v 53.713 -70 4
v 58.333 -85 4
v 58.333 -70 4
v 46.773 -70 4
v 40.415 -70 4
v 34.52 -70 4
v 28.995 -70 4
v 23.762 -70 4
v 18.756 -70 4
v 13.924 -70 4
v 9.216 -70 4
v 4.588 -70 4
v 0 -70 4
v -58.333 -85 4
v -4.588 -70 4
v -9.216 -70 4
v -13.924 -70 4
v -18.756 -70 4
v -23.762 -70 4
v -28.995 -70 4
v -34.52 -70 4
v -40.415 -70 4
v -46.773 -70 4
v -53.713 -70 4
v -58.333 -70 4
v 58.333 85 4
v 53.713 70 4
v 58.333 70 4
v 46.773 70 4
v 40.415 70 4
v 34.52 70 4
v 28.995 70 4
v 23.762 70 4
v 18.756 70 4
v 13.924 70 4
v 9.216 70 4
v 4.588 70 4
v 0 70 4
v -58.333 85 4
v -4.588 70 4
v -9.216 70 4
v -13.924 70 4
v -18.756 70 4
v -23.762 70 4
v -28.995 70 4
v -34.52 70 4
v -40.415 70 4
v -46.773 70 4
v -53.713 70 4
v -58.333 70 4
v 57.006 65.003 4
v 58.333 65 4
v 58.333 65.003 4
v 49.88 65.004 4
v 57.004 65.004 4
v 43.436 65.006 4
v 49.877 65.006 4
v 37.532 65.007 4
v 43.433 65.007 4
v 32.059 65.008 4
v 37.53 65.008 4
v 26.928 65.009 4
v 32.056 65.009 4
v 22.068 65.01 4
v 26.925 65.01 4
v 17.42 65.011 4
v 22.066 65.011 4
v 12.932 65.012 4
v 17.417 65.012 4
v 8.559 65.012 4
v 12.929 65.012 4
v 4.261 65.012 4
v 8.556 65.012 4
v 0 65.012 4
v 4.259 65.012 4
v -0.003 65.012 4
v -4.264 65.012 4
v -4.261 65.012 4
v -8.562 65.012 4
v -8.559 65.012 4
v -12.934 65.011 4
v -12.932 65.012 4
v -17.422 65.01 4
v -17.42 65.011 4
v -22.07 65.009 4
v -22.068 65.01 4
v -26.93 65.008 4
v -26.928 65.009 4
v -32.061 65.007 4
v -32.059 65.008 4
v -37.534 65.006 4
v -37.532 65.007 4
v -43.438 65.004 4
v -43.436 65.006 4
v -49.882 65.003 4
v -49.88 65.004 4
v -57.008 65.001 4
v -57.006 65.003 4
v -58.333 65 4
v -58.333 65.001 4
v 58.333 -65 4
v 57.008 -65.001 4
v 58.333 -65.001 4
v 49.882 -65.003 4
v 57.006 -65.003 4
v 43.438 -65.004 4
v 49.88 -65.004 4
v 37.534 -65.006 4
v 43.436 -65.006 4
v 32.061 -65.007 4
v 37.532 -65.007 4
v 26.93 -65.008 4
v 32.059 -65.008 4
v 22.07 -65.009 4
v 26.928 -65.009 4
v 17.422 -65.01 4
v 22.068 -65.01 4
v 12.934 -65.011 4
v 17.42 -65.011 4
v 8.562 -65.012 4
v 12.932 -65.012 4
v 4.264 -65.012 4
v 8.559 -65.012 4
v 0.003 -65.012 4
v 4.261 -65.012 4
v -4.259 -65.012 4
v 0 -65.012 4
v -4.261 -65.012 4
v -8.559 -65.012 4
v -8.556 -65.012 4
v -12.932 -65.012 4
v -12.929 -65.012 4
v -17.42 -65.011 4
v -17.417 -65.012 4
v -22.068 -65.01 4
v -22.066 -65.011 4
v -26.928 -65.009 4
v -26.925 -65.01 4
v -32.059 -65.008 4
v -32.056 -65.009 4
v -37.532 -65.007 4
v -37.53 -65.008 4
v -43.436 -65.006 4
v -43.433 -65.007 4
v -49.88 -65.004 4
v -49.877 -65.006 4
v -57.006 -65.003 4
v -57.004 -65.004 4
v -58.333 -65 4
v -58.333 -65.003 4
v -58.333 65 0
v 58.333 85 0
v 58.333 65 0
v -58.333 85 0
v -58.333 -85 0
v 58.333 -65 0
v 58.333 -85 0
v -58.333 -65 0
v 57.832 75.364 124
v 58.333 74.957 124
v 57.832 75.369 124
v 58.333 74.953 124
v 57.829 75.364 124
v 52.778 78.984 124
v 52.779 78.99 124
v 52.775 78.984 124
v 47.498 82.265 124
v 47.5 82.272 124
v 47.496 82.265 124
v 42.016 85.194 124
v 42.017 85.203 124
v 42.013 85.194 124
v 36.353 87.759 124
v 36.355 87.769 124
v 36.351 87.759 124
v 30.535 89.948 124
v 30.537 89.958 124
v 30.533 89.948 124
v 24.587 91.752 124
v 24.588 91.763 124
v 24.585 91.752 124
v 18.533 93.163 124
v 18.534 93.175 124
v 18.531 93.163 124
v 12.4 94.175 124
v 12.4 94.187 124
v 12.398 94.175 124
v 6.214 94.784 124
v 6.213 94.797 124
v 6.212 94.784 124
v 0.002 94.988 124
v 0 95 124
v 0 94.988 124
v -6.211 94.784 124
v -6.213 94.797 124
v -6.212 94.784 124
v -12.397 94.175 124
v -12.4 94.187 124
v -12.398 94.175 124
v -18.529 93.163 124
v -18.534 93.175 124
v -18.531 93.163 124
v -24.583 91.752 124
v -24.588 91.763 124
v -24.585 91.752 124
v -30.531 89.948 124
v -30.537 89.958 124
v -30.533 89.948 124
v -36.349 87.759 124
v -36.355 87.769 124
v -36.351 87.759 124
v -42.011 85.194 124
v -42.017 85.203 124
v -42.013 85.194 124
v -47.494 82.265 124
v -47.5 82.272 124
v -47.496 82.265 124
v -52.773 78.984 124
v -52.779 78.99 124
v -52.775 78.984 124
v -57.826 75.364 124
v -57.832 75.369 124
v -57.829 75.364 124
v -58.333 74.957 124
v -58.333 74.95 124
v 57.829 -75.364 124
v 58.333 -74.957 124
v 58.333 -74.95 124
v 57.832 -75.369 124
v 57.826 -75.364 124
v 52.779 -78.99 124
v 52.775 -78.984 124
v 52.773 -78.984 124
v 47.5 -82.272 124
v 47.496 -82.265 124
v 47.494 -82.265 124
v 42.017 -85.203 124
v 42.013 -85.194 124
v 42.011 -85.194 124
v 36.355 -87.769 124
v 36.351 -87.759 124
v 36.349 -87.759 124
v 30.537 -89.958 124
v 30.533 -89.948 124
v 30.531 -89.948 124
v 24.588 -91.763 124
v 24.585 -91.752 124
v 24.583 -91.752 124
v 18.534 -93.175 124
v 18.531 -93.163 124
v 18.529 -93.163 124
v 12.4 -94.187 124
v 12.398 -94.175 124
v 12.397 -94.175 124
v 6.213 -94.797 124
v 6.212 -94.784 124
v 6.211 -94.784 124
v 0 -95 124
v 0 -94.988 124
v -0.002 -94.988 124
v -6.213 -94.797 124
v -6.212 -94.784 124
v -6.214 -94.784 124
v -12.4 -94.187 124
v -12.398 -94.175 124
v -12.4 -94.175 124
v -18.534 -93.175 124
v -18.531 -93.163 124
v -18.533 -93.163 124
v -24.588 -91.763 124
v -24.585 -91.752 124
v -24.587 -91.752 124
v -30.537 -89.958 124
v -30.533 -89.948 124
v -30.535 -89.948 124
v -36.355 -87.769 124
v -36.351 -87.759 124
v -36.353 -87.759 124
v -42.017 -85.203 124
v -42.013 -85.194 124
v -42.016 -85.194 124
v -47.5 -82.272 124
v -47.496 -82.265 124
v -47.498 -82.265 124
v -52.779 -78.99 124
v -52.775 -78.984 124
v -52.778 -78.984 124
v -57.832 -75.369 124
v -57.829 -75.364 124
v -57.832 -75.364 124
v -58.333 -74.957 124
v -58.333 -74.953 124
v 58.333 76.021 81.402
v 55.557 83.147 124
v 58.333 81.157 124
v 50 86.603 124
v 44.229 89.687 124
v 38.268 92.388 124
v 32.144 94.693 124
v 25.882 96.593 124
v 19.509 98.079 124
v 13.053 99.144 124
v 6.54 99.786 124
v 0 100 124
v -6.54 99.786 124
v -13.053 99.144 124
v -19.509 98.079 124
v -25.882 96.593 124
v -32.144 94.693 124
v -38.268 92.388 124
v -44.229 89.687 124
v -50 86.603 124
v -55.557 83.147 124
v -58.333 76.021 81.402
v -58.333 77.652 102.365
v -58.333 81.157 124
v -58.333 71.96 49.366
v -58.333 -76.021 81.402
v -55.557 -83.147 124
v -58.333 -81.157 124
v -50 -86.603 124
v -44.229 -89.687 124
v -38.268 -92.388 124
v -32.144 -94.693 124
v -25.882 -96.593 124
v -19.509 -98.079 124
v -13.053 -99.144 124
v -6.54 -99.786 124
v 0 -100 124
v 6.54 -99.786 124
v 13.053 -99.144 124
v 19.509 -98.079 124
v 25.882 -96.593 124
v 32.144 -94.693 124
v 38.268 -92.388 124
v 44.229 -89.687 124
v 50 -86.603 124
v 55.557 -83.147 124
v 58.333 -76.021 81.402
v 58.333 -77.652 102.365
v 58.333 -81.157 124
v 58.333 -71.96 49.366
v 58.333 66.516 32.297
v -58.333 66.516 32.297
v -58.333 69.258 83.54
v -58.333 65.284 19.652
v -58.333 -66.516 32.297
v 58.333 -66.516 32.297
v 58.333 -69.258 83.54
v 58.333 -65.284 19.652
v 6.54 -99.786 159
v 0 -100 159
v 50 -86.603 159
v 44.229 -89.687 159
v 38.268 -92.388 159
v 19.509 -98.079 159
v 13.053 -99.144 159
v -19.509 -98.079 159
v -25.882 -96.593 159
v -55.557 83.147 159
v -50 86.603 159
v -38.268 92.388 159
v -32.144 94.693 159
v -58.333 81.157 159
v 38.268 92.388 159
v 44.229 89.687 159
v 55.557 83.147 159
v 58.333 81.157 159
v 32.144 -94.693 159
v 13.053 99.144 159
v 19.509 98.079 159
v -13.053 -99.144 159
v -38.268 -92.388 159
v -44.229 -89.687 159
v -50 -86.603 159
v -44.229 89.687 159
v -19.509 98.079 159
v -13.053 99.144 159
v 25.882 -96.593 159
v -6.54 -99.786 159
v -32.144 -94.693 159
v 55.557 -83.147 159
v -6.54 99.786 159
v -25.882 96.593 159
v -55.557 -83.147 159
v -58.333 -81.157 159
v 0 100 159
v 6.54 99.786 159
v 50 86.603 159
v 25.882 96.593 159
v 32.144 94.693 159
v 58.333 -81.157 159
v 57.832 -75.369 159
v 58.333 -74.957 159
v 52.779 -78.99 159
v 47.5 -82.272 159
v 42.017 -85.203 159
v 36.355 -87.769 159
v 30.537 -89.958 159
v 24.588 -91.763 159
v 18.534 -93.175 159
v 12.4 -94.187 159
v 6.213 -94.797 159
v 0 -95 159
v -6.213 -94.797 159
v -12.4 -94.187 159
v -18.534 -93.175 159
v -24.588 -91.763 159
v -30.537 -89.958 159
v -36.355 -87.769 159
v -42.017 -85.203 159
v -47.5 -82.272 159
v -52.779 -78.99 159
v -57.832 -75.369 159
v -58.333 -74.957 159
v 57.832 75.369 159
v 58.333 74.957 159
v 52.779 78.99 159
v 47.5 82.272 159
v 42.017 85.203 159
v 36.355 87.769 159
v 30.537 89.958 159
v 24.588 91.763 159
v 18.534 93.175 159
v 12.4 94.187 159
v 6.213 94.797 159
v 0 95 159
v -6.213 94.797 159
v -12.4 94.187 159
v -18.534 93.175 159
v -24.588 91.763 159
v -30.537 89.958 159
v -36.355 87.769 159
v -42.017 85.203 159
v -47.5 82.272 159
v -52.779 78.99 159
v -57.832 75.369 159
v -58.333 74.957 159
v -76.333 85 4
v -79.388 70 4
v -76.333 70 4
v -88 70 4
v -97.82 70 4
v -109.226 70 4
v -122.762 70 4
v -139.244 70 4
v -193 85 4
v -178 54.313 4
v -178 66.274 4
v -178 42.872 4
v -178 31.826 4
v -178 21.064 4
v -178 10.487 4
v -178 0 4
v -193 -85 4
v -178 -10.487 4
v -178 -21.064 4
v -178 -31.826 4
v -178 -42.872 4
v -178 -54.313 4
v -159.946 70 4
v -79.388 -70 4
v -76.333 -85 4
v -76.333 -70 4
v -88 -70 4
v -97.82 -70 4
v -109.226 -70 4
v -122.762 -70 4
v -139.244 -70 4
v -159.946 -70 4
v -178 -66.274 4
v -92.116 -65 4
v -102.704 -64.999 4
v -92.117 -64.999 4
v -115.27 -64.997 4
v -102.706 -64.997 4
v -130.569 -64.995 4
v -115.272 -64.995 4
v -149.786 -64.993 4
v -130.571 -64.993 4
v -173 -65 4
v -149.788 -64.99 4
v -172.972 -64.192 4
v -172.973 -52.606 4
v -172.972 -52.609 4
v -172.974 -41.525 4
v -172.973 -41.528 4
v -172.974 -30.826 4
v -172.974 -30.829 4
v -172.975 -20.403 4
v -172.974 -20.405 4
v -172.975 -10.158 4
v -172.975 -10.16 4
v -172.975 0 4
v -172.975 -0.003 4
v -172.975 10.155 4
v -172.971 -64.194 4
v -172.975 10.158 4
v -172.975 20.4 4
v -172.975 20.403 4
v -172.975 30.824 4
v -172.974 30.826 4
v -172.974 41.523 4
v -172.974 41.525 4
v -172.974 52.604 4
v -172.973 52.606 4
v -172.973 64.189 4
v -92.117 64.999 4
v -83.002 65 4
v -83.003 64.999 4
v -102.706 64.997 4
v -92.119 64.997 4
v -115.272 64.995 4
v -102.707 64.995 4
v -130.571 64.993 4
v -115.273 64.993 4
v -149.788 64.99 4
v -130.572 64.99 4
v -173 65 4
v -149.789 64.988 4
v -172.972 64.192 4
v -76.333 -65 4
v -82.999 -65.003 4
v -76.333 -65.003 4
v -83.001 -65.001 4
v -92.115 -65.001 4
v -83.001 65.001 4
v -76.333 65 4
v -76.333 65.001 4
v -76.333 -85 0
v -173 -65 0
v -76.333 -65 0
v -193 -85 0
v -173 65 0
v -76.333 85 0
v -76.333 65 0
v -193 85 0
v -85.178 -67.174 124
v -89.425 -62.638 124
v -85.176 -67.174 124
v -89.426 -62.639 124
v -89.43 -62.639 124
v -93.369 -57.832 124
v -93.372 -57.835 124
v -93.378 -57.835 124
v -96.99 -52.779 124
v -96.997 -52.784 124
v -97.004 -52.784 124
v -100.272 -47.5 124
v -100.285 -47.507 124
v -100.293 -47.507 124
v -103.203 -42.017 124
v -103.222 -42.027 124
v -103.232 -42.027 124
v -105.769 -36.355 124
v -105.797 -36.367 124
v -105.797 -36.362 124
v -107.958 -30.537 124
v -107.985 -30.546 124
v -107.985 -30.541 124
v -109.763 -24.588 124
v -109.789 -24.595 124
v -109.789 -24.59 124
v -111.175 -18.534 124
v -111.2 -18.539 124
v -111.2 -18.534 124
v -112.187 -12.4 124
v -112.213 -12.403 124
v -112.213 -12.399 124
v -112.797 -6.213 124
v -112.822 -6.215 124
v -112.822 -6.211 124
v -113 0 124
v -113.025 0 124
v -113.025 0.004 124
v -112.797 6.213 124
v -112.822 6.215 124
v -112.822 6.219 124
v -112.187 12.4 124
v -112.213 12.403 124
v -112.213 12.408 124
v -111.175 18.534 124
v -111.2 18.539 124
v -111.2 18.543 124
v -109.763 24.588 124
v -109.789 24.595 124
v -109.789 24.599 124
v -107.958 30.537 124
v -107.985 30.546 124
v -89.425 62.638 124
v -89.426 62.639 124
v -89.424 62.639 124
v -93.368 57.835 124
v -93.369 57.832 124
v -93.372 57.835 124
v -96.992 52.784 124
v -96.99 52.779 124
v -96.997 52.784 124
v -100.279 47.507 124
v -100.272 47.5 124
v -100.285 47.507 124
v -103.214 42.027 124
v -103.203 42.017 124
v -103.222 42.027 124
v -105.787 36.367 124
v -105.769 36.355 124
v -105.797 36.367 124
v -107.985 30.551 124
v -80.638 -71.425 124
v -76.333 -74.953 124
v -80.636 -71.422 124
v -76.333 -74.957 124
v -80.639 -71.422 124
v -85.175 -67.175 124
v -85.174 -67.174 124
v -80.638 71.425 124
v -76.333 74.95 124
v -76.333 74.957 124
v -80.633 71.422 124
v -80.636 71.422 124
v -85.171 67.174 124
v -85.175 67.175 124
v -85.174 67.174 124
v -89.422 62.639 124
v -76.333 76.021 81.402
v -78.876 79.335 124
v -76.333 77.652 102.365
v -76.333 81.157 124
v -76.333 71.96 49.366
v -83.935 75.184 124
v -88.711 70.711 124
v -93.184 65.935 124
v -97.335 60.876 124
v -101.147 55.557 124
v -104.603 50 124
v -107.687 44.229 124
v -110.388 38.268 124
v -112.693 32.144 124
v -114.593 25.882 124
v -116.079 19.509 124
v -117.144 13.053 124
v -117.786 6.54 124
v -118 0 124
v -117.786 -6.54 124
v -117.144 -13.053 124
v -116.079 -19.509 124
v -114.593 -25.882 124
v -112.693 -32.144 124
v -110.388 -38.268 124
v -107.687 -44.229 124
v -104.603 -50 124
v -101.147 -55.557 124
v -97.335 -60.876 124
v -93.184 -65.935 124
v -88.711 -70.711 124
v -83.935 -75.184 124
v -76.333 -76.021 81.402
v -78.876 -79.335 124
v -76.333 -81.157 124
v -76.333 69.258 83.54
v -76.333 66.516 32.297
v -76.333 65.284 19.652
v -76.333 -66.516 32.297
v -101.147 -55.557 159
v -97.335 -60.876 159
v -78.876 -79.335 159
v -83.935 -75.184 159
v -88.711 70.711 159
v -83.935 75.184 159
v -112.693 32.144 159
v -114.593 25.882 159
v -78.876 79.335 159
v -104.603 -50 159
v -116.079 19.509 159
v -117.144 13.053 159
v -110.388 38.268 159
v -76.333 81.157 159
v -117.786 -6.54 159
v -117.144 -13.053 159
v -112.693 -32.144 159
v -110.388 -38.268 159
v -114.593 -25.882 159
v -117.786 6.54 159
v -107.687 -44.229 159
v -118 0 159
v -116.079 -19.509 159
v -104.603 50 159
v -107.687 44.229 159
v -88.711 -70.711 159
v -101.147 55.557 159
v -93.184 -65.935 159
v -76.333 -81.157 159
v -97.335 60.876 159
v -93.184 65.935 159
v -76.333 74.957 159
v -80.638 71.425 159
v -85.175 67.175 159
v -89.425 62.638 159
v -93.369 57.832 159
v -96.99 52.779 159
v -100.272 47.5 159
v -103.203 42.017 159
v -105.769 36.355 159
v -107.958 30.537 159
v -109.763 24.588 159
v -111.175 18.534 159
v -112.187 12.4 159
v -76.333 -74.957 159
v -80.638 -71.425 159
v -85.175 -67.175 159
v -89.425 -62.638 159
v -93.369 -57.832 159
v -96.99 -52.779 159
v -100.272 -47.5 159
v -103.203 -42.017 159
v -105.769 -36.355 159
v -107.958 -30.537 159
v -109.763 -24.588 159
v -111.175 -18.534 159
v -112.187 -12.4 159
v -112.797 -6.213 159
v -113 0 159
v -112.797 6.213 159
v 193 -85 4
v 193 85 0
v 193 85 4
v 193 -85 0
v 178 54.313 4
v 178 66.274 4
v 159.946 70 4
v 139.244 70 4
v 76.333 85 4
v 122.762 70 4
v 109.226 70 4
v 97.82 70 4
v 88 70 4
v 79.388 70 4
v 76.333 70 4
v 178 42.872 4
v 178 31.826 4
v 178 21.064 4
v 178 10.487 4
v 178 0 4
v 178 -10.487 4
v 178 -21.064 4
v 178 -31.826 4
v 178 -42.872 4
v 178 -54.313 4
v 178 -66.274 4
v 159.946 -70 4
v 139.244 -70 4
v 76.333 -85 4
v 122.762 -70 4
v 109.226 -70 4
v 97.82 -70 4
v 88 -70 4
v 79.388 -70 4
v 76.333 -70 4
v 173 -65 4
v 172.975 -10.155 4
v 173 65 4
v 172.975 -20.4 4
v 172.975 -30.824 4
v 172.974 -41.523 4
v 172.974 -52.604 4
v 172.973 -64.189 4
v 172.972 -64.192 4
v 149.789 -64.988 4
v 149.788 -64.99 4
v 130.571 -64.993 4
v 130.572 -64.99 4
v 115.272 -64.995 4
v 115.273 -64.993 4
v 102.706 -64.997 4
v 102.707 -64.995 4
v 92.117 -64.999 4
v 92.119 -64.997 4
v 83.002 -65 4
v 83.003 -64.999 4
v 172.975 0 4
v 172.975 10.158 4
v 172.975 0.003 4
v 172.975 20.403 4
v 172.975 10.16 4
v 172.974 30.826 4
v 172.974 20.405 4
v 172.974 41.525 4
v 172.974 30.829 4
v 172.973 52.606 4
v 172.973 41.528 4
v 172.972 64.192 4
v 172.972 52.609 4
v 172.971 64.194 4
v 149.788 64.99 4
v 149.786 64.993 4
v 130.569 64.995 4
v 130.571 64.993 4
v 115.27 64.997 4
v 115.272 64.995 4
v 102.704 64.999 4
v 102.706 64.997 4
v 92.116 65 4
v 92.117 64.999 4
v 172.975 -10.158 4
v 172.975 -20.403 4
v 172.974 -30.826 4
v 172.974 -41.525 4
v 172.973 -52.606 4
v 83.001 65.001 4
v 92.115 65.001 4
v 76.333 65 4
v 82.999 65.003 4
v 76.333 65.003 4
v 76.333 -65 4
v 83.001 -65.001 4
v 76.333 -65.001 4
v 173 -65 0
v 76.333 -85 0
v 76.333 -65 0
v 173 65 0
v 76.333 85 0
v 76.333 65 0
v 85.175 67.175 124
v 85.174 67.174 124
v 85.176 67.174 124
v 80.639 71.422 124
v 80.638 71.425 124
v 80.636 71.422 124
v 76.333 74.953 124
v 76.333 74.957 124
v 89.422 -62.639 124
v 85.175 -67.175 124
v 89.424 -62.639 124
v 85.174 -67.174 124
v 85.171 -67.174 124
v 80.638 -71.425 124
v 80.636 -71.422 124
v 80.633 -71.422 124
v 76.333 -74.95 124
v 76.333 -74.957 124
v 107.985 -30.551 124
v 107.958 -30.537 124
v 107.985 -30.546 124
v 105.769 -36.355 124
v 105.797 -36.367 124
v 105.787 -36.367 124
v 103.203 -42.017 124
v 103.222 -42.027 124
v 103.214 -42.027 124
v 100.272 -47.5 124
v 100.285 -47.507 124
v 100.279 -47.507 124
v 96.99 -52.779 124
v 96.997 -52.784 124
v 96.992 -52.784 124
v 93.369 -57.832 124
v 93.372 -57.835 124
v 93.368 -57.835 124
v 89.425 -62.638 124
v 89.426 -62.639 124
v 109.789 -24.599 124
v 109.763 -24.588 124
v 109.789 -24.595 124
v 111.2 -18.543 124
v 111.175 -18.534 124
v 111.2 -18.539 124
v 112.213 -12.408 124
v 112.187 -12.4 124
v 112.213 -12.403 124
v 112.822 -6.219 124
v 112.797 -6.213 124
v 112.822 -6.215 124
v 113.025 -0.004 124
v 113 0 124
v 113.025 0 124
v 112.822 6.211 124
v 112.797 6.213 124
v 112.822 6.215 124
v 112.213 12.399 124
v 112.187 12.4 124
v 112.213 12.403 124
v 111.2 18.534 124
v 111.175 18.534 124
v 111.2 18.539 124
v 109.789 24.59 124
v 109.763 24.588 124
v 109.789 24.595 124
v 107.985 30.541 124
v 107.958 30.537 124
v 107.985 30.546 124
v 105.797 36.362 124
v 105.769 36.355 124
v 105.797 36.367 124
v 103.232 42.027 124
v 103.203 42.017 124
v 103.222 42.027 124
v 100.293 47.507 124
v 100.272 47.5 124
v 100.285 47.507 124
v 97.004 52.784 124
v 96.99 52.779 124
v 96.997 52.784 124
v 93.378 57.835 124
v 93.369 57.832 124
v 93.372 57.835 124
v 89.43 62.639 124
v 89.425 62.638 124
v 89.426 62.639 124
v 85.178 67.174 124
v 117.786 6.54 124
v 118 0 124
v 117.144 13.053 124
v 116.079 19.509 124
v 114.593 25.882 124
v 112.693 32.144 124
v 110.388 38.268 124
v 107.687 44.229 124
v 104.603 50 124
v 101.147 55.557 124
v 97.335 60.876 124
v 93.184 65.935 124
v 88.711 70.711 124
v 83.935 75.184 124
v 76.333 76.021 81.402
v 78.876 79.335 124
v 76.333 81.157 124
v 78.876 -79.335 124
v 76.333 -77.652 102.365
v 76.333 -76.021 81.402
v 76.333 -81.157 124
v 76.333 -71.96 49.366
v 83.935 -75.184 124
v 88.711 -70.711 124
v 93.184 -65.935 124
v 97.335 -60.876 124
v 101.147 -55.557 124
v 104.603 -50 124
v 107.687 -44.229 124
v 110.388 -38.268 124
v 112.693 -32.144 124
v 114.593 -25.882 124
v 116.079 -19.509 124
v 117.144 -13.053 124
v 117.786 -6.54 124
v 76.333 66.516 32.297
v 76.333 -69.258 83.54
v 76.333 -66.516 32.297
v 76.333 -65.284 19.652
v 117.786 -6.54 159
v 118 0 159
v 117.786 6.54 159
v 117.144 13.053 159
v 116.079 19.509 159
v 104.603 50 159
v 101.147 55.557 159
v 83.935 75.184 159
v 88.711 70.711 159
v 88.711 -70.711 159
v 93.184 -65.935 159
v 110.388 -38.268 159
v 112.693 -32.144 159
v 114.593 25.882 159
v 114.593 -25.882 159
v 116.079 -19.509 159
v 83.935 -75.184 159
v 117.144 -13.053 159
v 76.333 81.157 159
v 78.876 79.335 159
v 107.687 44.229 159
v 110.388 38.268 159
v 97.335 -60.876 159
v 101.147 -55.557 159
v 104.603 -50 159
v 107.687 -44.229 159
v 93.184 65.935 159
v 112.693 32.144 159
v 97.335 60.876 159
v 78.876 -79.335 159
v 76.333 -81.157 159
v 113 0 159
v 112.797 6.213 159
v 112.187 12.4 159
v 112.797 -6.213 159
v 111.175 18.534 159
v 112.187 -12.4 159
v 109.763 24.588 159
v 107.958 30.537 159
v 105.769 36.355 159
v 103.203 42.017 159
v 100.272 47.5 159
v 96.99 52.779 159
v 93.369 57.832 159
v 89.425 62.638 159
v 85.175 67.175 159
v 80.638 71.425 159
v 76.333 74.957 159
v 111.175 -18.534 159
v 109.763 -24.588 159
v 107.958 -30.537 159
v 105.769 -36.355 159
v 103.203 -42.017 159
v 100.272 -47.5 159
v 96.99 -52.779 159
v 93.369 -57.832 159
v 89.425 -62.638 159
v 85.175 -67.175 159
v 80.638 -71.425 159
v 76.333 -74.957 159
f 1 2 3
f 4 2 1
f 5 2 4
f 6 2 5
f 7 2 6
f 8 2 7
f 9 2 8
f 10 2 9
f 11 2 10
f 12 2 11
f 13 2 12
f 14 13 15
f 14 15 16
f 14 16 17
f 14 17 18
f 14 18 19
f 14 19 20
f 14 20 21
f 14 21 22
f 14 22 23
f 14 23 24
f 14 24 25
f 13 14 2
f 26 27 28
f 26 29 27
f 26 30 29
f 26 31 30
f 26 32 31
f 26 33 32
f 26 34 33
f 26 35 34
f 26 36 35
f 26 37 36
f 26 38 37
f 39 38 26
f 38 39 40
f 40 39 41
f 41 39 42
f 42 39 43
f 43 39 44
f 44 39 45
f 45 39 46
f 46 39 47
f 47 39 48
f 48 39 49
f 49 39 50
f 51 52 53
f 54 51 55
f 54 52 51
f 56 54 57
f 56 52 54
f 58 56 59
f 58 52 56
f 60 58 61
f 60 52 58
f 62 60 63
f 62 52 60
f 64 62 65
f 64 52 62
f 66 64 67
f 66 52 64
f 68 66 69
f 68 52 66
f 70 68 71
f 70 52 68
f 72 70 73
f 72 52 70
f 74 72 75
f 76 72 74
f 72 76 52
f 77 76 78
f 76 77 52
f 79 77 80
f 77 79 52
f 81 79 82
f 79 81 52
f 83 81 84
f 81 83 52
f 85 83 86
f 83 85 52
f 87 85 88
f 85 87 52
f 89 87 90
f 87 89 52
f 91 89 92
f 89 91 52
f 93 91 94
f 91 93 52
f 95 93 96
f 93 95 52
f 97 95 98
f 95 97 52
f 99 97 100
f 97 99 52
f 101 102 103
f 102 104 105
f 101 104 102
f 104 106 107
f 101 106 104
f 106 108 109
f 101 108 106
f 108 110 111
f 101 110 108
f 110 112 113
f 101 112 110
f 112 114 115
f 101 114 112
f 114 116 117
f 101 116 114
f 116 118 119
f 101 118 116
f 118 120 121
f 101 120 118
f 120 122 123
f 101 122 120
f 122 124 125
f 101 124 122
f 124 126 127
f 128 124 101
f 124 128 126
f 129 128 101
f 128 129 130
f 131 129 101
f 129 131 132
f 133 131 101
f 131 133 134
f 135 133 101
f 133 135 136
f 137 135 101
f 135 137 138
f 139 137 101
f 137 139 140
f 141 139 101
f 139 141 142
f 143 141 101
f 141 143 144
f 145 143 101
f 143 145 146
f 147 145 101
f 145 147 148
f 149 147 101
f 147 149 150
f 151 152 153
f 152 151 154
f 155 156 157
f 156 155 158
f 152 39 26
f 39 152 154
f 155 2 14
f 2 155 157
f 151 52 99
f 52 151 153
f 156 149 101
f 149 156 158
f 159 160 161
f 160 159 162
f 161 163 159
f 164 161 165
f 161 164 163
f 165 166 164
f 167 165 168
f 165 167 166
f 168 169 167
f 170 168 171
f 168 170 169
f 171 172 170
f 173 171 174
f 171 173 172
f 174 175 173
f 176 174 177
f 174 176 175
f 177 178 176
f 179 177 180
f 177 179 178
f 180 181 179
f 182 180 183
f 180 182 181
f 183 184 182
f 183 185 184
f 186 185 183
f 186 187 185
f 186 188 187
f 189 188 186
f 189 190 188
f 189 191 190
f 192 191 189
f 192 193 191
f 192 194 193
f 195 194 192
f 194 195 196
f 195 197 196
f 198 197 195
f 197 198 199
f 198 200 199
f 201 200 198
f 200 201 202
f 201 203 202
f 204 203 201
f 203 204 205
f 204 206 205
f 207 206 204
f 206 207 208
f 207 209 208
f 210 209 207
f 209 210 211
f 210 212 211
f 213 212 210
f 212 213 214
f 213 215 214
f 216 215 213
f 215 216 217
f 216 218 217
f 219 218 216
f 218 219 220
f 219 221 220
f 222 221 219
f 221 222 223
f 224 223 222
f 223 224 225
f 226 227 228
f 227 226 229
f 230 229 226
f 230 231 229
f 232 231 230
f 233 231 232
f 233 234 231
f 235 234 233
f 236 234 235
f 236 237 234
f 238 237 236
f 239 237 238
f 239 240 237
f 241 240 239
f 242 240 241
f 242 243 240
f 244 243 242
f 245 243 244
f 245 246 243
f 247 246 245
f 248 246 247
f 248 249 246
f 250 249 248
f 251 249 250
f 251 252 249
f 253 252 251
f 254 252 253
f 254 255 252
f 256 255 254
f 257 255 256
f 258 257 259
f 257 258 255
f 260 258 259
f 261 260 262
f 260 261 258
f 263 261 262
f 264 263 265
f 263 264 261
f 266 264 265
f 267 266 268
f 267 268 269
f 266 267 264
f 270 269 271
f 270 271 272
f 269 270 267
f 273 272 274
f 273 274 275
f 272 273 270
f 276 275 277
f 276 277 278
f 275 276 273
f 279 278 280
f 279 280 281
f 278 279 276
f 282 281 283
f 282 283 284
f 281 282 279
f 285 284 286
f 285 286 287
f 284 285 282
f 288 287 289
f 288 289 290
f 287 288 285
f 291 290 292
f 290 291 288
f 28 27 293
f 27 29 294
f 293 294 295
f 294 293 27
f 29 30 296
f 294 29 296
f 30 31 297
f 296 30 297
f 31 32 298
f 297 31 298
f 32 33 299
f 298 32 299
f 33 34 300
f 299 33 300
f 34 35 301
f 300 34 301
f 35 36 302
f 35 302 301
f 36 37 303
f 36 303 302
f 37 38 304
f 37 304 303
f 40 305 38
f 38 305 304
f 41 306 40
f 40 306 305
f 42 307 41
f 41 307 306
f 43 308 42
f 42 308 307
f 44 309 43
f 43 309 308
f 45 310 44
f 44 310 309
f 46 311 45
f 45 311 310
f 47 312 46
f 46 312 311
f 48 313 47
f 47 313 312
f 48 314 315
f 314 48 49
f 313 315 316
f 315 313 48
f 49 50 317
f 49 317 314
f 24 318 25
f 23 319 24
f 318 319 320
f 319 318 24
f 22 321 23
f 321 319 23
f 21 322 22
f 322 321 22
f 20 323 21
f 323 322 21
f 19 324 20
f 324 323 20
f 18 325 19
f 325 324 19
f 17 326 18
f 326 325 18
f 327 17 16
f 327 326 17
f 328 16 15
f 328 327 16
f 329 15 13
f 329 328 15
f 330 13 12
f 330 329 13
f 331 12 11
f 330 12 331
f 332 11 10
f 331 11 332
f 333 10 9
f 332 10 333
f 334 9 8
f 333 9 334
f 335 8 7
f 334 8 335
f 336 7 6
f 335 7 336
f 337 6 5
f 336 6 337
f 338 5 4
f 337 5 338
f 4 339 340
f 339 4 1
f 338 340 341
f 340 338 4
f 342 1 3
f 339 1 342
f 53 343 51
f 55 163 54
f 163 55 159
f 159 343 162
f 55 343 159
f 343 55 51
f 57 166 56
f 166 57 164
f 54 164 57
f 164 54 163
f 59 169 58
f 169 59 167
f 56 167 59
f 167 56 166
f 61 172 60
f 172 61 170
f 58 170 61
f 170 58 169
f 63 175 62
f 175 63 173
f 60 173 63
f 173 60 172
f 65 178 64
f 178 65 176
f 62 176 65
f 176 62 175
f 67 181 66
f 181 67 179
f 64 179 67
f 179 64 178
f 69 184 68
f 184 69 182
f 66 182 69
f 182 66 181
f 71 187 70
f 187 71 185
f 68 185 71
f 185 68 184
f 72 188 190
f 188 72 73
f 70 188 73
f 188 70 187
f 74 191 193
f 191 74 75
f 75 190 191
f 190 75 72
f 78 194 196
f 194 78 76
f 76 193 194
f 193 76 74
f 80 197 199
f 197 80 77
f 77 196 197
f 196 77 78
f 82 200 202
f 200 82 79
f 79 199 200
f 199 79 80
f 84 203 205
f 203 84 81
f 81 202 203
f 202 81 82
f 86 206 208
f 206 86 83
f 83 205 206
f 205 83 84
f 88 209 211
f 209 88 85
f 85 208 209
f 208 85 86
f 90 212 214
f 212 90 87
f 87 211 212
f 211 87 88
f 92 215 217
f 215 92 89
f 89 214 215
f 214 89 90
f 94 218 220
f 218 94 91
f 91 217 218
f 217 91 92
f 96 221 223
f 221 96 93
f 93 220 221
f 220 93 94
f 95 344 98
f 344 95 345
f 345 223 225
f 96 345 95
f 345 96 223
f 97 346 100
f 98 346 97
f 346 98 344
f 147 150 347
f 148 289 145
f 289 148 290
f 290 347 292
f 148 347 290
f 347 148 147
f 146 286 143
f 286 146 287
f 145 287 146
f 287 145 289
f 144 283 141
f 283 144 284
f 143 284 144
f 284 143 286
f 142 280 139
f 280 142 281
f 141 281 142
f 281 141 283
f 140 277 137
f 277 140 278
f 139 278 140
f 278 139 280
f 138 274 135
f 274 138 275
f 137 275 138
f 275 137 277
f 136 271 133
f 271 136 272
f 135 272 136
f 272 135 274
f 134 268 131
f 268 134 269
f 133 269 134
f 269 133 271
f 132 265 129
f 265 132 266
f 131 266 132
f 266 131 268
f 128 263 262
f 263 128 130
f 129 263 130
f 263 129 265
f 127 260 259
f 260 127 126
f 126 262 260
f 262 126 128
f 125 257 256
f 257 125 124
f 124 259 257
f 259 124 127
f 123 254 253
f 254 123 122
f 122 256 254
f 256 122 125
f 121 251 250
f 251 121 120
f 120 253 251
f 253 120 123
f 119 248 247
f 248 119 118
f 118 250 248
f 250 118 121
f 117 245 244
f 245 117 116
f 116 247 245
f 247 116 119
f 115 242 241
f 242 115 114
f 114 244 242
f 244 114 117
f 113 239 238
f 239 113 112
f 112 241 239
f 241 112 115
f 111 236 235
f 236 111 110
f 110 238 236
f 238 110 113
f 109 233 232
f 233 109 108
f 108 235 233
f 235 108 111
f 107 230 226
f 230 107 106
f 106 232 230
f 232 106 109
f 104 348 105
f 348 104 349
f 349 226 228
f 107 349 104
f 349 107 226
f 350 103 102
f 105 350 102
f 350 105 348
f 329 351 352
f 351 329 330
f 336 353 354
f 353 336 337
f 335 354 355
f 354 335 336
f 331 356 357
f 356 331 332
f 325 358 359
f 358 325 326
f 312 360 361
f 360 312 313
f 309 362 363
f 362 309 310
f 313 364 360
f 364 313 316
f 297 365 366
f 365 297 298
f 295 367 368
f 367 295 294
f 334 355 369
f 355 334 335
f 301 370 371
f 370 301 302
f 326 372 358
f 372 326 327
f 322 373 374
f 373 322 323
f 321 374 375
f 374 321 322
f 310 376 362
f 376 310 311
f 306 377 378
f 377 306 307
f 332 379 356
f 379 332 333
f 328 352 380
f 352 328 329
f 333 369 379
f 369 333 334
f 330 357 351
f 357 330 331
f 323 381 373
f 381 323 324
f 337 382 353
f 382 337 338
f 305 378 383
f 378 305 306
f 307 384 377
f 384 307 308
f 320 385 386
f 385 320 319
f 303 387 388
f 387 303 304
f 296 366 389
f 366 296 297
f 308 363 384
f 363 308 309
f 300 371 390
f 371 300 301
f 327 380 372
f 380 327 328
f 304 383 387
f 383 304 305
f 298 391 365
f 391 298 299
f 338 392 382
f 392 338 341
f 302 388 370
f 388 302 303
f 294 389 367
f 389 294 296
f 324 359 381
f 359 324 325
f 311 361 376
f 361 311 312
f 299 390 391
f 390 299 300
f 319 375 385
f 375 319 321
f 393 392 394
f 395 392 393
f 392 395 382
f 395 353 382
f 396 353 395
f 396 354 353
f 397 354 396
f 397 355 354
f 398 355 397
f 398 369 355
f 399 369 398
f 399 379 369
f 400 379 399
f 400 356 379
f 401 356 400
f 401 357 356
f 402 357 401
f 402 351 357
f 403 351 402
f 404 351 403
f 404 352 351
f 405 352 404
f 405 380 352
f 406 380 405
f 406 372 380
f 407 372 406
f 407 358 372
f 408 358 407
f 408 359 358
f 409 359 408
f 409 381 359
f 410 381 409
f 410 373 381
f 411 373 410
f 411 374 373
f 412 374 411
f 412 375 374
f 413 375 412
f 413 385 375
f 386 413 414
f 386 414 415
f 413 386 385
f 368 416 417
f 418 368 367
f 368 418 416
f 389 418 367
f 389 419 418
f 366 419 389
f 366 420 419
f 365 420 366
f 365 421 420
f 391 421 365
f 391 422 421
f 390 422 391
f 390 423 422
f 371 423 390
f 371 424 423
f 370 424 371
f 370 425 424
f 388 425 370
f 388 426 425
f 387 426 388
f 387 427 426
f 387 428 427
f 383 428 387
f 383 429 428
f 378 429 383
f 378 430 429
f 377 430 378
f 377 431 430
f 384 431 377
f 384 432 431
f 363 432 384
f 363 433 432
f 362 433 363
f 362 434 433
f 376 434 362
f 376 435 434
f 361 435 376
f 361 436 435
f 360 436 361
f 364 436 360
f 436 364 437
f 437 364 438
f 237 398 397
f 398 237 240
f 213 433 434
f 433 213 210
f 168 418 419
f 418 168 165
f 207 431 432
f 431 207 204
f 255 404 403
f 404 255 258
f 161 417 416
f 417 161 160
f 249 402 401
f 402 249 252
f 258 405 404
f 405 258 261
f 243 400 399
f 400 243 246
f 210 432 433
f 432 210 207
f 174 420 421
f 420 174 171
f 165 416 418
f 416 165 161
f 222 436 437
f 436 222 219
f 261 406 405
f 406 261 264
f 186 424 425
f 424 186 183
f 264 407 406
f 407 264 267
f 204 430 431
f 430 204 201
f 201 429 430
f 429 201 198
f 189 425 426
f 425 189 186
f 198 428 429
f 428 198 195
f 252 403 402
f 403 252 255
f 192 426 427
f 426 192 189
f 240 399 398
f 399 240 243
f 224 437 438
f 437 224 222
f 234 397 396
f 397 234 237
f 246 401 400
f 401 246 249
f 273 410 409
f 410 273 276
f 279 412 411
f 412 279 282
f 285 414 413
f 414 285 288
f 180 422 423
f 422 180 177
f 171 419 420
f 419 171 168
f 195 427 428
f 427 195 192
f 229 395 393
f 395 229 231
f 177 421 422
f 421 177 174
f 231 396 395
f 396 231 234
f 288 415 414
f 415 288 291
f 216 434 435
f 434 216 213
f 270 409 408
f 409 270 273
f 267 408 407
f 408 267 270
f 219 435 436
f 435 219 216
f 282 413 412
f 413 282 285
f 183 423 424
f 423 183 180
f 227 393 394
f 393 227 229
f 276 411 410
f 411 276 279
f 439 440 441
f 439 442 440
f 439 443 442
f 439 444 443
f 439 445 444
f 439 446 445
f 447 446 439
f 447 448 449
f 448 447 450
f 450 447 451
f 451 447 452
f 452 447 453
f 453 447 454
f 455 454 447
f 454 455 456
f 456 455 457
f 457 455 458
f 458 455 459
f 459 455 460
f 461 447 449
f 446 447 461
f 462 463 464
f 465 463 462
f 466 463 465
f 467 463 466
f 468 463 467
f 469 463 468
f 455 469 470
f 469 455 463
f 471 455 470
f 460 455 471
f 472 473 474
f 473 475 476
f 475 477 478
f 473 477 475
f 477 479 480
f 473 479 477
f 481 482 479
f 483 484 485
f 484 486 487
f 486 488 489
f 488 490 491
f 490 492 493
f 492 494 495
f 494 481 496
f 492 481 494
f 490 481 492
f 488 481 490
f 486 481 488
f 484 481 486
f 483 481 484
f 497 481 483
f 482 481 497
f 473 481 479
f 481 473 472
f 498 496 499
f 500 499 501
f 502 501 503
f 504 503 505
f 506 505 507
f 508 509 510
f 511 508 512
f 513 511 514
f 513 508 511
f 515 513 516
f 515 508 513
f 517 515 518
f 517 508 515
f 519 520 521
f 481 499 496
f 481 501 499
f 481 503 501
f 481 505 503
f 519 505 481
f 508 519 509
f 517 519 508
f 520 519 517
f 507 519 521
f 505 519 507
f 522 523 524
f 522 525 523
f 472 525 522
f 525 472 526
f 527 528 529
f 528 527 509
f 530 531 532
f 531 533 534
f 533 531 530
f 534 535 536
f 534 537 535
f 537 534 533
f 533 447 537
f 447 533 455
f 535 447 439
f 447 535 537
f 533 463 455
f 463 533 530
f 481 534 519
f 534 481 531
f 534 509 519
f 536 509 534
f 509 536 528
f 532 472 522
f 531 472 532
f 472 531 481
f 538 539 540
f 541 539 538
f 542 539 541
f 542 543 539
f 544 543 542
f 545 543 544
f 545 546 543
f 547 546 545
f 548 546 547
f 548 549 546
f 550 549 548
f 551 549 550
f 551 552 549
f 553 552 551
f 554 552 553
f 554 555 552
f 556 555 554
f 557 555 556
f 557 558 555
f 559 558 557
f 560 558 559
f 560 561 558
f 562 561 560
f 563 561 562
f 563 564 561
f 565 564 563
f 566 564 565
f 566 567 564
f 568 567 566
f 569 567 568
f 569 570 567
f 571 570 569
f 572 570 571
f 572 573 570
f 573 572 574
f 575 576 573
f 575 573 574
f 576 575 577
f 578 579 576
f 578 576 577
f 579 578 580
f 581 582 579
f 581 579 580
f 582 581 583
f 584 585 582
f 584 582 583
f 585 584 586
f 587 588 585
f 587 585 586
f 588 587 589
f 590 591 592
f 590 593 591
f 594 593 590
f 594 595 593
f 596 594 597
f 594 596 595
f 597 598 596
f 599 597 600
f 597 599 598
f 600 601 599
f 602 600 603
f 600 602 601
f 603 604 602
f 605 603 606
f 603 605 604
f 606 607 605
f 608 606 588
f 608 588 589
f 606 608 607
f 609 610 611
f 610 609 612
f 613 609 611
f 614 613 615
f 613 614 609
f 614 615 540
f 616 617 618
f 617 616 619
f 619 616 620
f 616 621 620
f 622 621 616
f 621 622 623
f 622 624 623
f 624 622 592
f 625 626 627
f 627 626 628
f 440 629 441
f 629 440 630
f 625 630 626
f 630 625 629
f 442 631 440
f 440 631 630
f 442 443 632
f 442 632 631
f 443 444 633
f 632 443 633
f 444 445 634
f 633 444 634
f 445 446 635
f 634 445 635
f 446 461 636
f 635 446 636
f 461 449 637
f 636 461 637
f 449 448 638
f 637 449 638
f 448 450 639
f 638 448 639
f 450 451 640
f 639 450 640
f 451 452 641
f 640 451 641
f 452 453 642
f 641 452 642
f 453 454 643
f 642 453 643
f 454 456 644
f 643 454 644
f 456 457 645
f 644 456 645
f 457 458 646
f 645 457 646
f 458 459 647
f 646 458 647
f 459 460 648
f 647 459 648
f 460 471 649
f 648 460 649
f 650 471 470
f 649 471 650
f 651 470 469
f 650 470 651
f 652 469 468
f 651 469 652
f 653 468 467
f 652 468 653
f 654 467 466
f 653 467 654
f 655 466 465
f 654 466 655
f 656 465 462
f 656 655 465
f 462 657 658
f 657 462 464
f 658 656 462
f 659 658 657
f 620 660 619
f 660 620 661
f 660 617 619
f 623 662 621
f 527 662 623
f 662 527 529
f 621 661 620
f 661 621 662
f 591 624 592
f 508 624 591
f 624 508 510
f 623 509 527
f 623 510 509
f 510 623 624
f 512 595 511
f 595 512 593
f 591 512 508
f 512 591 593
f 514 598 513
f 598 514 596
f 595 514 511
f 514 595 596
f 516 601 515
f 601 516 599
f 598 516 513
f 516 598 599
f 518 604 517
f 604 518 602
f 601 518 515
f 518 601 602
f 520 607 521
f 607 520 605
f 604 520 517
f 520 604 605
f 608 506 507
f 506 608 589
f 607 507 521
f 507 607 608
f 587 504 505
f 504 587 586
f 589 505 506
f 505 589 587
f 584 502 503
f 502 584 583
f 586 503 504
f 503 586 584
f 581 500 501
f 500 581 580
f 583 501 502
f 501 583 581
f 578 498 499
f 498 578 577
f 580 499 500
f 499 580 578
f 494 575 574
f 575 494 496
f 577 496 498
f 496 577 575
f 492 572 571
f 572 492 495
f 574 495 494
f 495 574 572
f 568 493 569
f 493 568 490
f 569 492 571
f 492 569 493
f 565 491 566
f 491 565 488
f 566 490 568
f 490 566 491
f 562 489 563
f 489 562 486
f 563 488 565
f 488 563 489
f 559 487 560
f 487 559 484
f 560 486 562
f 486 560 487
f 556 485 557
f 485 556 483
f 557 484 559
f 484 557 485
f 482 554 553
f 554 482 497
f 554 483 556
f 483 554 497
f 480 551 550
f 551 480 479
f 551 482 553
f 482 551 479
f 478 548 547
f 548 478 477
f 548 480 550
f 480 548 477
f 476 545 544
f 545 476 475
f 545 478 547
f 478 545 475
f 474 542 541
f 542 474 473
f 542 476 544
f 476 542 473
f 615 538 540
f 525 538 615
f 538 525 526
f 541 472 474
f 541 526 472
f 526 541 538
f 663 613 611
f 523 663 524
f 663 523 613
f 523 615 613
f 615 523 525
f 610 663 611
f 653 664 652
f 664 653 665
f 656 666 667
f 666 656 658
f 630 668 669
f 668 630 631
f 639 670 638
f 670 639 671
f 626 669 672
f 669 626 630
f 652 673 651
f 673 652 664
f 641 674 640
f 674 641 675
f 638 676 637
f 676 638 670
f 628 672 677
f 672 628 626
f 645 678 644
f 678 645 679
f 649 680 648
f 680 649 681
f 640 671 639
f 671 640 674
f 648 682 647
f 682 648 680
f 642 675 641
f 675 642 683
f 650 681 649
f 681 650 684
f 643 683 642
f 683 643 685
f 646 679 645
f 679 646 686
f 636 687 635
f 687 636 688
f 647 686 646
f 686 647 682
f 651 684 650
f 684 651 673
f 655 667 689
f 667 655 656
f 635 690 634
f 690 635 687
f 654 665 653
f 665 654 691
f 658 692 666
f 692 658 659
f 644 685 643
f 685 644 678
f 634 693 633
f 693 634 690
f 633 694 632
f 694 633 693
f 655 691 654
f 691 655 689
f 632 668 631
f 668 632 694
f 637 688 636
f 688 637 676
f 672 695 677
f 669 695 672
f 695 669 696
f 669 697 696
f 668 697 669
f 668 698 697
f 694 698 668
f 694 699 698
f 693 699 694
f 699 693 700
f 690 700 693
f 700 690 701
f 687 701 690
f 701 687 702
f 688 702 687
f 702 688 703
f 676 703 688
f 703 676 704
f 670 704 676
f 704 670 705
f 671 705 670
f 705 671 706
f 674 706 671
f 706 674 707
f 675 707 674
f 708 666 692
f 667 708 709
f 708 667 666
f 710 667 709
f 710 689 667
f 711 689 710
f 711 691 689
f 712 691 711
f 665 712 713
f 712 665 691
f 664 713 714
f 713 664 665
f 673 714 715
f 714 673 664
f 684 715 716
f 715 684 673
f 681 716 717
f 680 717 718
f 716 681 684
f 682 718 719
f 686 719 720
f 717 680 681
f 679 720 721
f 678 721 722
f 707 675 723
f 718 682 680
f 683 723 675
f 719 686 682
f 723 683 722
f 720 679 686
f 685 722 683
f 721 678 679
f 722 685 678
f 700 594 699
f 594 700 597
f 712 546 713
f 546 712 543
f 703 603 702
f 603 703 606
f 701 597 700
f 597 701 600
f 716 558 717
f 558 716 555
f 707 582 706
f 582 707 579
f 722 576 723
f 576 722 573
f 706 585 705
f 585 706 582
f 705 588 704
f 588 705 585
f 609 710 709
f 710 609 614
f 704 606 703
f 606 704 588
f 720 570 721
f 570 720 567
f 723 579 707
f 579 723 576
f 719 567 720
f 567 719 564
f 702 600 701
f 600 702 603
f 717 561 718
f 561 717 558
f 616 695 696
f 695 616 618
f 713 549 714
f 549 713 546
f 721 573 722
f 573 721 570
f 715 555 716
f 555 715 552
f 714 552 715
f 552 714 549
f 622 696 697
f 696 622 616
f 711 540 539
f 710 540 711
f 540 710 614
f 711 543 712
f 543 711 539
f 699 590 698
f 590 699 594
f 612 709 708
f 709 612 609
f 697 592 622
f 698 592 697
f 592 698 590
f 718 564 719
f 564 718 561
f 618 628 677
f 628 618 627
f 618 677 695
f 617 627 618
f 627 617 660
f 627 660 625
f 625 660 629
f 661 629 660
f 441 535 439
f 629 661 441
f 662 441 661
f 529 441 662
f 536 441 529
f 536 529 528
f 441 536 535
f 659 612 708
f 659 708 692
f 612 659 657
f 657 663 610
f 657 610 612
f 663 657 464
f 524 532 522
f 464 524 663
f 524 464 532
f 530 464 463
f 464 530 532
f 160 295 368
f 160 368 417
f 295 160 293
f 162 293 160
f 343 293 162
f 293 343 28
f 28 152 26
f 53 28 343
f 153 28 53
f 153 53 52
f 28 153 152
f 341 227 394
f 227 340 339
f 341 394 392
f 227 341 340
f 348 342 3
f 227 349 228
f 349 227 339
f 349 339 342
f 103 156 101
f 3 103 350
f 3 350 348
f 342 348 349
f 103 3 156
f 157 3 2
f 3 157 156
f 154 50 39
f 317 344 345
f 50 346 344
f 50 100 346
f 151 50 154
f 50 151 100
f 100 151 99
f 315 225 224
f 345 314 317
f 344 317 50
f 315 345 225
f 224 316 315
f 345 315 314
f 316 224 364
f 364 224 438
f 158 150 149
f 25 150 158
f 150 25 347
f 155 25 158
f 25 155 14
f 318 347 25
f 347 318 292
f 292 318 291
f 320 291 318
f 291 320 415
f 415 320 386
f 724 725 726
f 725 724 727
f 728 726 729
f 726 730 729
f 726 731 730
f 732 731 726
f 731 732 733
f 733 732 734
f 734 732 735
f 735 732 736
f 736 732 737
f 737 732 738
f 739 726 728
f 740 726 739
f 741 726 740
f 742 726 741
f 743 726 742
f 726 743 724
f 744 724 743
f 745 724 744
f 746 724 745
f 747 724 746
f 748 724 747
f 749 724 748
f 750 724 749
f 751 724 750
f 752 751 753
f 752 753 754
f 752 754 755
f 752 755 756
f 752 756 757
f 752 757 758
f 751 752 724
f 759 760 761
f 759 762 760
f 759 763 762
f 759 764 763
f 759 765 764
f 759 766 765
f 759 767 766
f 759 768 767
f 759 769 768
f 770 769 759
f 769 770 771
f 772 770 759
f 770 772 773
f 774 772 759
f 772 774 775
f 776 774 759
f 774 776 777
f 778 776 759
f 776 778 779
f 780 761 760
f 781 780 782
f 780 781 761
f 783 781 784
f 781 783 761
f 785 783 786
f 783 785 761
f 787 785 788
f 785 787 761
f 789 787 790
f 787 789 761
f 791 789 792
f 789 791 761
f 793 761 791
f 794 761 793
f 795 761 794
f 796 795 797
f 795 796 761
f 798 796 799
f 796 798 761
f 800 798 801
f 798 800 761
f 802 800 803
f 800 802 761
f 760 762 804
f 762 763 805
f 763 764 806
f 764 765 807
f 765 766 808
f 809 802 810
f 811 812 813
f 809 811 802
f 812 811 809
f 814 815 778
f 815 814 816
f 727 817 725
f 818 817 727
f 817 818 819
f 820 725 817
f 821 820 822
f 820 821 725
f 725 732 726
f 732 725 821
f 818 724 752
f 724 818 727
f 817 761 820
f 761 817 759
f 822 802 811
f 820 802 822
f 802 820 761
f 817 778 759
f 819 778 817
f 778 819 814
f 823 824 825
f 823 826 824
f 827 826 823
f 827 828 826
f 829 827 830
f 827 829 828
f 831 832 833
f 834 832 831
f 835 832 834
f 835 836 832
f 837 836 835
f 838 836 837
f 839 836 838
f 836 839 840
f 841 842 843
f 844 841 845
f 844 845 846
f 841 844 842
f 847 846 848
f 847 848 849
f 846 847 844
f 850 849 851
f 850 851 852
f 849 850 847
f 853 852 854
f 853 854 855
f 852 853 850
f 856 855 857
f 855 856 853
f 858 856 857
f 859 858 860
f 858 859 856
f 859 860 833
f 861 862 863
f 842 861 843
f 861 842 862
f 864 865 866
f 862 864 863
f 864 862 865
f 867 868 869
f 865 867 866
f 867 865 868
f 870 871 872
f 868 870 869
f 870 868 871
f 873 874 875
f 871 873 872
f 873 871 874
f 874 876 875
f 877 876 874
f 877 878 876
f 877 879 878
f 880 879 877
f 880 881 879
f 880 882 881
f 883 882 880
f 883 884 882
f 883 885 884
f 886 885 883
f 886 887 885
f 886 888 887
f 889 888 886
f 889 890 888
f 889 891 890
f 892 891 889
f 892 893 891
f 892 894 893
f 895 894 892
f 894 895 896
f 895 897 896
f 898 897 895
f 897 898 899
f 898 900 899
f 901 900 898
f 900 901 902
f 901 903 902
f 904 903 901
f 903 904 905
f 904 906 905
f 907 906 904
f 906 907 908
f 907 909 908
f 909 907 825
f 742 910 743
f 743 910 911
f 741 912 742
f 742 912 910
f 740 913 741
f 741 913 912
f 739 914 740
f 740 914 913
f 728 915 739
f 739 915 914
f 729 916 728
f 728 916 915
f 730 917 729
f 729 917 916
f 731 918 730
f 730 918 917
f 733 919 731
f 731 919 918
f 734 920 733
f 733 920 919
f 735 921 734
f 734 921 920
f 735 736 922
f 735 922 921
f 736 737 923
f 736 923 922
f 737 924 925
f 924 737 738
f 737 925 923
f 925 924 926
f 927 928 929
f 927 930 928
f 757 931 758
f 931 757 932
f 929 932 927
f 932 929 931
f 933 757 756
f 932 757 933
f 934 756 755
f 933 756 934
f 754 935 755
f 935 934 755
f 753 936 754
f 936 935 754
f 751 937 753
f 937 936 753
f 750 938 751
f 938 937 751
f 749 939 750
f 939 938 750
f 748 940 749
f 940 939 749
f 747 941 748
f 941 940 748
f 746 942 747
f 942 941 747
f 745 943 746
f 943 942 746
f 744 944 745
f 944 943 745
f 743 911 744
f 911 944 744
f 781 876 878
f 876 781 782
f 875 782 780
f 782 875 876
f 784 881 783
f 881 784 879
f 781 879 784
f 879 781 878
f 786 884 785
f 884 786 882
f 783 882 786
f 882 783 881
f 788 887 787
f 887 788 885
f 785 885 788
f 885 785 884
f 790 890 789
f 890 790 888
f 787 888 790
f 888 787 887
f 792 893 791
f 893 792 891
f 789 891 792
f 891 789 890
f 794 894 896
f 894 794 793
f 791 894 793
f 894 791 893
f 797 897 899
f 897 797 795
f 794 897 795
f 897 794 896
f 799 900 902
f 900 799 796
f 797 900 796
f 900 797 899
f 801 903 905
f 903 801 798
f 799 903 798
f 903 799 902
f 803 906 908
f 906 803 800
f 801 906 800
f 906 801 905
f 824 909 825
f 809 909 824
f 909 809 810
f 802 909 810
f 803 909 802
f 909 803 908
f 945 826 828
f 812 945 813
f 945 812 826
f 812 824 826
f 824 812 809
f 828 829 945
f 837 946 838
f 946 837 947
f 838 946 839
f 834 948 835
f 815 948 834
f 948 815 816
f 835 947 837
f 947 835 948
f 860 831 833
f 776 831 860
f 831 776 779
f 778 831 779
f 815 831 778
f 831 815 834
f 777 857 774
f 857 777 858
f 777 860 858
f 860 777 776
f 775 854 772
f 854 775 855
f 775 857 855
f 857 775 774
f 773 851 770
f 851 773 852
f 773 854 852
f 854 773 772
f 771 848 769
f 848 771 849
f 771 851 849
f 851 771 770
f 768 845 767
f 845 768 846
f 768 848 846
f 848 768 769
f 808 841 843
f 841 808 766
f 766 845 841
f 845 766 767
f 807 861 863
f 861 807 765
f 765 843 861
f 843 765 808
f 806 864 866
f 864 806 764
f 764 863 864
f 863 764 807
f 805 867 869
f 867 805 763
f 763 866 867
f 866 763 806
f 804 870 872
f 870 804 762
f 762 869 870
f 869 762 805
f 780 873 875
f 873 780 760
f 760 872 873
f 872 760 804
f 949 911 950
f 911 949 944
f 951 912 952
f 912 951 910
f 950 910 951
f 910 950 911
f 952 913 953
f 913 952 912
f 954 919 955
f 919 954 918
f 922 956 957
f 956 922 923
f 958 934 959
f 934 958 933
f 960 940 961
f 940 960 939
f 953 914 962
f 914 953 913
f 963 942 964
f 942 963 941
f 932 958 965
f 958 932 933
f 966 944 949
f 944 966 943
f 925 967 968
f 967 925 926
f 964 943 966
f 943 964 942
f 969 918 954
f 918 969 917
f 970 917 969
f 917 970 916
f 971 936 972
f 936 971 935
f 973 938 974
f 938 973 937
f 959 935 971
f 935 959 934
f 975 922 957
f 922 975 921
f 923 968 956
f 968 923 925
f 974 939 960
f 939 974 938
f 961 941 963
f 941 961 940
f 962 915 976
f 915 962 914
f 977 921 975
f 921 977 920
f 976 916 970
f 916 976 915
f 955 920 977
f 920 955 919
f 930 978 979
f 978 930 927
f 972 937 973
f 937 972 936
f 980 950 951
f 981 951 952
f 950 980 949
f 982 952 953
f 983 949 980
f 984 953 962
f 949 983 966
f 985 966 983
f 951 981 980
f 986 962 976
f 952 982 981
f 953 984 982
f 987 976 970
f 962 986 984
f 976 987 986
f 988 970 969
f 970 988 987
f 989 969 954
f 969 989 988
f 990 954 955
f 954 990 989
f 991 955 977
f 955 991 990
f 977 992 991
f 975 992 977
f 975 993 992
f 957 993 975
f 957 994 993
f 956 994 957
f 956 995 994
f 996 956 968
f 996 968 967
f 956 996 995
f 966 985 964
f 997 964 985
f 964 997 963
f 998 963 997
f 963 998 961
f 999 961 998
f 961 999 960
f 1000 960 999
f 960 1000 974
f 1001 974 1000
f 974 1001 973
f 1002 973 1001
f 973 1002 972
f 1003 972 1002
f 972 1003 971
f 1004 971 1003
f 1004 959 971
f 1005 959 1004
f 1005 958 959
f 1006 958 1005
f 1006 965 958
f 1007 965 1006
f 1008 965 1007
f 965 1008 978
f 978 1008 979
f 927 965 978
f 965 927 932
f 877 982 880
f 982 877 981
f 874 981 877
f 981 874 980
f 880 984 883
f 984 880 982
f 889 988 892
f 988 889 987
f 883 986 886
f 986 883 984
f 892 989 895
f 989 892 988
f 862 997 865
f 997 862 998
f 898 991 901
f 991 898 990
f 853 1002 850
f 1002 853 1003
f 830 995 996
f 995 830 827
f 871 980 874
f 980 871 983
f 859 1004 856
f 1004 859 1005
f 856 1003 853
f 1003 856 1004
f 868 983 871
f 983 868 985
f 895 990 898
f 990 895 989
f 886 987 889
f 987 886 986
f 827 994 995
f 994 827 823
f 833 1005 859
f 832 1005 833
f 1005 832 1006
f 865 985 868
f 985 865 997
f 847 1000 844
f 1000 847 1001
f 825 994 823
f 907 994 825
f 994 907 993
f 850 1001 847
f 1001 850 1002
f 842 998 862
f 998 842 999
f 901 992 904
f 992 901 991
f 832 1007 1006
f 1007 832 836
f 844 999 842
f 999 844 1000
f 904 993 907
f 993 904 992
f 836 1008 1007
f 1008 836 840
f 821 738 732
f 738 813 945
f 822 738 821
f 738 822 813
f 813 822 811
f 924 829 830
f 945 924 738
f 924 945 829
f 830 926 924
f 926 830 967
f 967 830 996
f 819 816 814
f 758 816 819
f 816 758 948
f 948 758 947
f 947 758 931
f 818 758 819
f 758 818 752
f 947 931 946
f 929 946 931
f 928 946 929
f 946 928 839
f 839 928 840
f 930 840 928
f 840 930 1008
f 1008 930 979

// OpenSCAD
/*
  Modular rectangular-to-round duct adapter for 200x200x200 mm printer
  --------------------------------------------------------------------
  Units: millimetres

  Target dimensions:
  - Circular outlet: 200 mm external diameter, 190 mm internal diameter
  - Rectangular inlet: 310 x 130 mm internal opening
  - Rectangular flange: 20 mm flat flange on every side
  - Split into 3 printable pieces along the long 310 mm direction

  Usage:
  - Set show_part = "left", "middle", or "right" and export each STL separately.
  - show_part = "all" shows the 3 pieces slightly separated for checking.
  - show_part = "complete" shows the unsplit duct.

  Printer fit:
  - Each split part is about 117 x 200 x 159 mm.
  - 200 mm OD is exactly at the bed limit. If needed set:
      circle_od = 198;
      circle_id = 188;

  PETG suggestion:
  - Print upright, rectangular flange on build plate.
  - 4-5 walls/perimeters, 25-40% infill.
  - Sand/roughen split faces before gluing.
*/

// ---------------- USER PARAMETERS ----------------
show_part = "all";     // "all", "left", "middle", "right", "complete"

rect_iw = 310;         // rectangular internal width, long side
rect_id = 130;         // rectangular internal depth, short side
circle_od = 200;       // circular external diameter
circle_id = 190;       // circular internal diameter

wall = (circle_od - circle_id) / 2;   // normally 5 mm
flange_extension = 20;                // flat flange around rectangular opening
flange_t = 4;                         // flange thickness
transition_h = 120;                   // rectangular-to-round transition height
collar_h = 35;                        // straight circular collar height

segments = 96;        // circular resolution; lower = faster render, 64 is also OK
exploded_gap = 18;    // visual gap for show_part="all"
eps = 0.05;

// ---------------- DERIVED DIMENSIONS ----------------
rect_ow = rect_iw + 2 * wall;
rect_od = rect_id + 2 * wall;
flange_w = rect_iw + 2 * flange_extension;
flange_d = rect_id + 2 * flange_extension;
total_h = flange_t + transition_h + collar_h;
clip_d = max(circle_od, flange_d) + 2;

split_x1 = -flange_w / 2;
split_x2 = -flange_w / 6;
split_x3 =  flange_w / 6;
split_x4 =  flange_w / 2;

// ---------------- PROFILE FUNCTIONS ----------------
// OpenSCAD trig functions use degrees.
function safe_abs(v) = max(abs(v), 0.000001);

// Point on a rectangle boundary found by shooting a ray from centre.
// This produces a rectangle profile with the same vertex count as the circle.
function rect_ray_point(i, n, w, d) =
    let(a = 360 * i / n,
        c = cos(a),
        s = sin(a),
        hx = w / 2,
        hy = d / 2,
        scale = min(hx / safe_abs(c), hy / safe_abs(s)))
    [scale * c, scale * s];

function circle_point(i, n, r) =
    let(a = 360 * i / n)
    [r * cos(a), r * sin(a)];

function rect_profile(n, w, d) = [for (i = [0:n-1]) rect_ray_point(i, n, w, d)];
function circle_profile(n, r) = [for (i = [0:n-1]) circle_point(i, n, r)];

// ---------------- BASIC GEOMETRY ----------------
module loft(profile_a, profile_b, z_a, z_b) {
    n = len(profile_a);

    pts = concat(
        [for (p = profile_a) [p[0], p[1], z_a]],
        [for (p = profile_b) [p[0], p[1], z_b]]
    );

    bottom_face = [[for (i = [n-1:-1:0]) i]];
    top_face    = [[for (i = [0:n-1]) n + i]];

    side_faces = [
        for (i = [0:n-1], tri = [
            [i, (i + 1) % n, n + ((i + 1) % n)],
            [i, n + ((i + 1) % n), n + i]
        ]) tri
    ];

    polyhedron(points = pts, faces = concat(bottom_face, top_face, side_faces), convexity = 10);
}

module rectangular_flange() {
    difference() {
        translate([0, 0, flange_t / 2])
            cube([flange_w, flange_d, flange_t], center = true);

        // Exact rectangular airflow opening through the flange.
        translate([0, 0, flange_t / 2])
            cube([rect_iw, rect_id, flange_t + 2 * eps], center = true);
    }
}

module transition_shell() {
    difference() {
        loft(
            rect_profile(segments, rect_ow, rect_od),
            circle_profile(segments, circle_od / 2),
            flange_t,
            flange_t + transition_h
        );

        // Slightly over-extended cutter avoids coincident faces.
        loft(
            rect_profile(segments, rect_iw, rect_id),
            circle_profile(segments, circle_id / 2),
            flange_t - eps,
            flange_t + transition_h + eps
        );
    }
}

module circular_collar() {
    translate([0, 0, flange_t + transition_h])
        difference() {
            cylinder(h = collar_h, r = circle_od / 2, $fn = segments);
            translate([0, 0, -eps])
                cylinder(h = collar_h + 2 * eps, r = circle_id / 2, $fn = segments);
        }
}

module complete_duct() {
    union() {
        rectangular_flange();
        transition_shell();
        circular_collar();
    }
}

// ---------------- SPLITTING ----------------
module clip_x(x_min, x_max) {
    intersection() {
        complete_duct();
        translate([(x_min + x_max) / 2, 0, total_h / 2])
            cube([x_max - x_min, clip_d, total_h + 2], center = true);
    }
}

module part_left()   { clip_x(split_x1, split_x2); }
module part_middle() { clip_x(split_x2, split_x3); }
module part_right()  { clip_x(split_x3, split_x4); }

// ---------------- OUTPUT SELECTOR ----------------
if (show_part == "complete") {
    complete_duct();
}
else if (show_part == "left") {
    part_left();
}
else if (show_part == "middle") {
    part_middle();
}
else if (show_part == "right") {
    part_right();
}
else { // "all"
    translate([-exploded_gap, 0, 0]) part_left();
    part_middle();
    translate([ exploded_gap, 0, 0]) part_right();
}
